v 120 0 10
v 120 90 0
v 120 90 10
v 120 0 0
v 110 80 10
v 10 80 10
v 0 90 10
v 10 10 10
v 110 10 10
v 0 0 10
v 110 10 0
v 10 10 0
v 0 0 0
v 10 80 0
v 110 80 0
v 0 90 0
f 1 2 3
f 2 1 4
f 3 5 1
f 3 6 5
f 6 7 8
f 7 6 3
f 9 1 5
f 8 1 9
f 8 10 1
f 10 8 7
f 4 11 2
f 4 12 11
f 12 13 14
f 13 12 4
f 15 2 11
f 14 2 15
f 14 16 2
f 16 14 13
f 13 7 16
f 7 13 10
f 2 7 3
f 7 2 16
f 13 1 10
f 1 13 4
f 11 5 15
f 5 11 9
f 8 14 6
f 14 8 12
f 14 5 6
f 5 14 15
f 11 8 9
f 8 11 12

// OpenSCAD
// EcoNote+ Enclosure Top (simplified functional model)
$fn=80;
difference() {
  cube([120, 90, 10], center=false);  // Main top shell
  translate([10, 10, -1]) cube([100, 70, 12]); // hollow cut
}
